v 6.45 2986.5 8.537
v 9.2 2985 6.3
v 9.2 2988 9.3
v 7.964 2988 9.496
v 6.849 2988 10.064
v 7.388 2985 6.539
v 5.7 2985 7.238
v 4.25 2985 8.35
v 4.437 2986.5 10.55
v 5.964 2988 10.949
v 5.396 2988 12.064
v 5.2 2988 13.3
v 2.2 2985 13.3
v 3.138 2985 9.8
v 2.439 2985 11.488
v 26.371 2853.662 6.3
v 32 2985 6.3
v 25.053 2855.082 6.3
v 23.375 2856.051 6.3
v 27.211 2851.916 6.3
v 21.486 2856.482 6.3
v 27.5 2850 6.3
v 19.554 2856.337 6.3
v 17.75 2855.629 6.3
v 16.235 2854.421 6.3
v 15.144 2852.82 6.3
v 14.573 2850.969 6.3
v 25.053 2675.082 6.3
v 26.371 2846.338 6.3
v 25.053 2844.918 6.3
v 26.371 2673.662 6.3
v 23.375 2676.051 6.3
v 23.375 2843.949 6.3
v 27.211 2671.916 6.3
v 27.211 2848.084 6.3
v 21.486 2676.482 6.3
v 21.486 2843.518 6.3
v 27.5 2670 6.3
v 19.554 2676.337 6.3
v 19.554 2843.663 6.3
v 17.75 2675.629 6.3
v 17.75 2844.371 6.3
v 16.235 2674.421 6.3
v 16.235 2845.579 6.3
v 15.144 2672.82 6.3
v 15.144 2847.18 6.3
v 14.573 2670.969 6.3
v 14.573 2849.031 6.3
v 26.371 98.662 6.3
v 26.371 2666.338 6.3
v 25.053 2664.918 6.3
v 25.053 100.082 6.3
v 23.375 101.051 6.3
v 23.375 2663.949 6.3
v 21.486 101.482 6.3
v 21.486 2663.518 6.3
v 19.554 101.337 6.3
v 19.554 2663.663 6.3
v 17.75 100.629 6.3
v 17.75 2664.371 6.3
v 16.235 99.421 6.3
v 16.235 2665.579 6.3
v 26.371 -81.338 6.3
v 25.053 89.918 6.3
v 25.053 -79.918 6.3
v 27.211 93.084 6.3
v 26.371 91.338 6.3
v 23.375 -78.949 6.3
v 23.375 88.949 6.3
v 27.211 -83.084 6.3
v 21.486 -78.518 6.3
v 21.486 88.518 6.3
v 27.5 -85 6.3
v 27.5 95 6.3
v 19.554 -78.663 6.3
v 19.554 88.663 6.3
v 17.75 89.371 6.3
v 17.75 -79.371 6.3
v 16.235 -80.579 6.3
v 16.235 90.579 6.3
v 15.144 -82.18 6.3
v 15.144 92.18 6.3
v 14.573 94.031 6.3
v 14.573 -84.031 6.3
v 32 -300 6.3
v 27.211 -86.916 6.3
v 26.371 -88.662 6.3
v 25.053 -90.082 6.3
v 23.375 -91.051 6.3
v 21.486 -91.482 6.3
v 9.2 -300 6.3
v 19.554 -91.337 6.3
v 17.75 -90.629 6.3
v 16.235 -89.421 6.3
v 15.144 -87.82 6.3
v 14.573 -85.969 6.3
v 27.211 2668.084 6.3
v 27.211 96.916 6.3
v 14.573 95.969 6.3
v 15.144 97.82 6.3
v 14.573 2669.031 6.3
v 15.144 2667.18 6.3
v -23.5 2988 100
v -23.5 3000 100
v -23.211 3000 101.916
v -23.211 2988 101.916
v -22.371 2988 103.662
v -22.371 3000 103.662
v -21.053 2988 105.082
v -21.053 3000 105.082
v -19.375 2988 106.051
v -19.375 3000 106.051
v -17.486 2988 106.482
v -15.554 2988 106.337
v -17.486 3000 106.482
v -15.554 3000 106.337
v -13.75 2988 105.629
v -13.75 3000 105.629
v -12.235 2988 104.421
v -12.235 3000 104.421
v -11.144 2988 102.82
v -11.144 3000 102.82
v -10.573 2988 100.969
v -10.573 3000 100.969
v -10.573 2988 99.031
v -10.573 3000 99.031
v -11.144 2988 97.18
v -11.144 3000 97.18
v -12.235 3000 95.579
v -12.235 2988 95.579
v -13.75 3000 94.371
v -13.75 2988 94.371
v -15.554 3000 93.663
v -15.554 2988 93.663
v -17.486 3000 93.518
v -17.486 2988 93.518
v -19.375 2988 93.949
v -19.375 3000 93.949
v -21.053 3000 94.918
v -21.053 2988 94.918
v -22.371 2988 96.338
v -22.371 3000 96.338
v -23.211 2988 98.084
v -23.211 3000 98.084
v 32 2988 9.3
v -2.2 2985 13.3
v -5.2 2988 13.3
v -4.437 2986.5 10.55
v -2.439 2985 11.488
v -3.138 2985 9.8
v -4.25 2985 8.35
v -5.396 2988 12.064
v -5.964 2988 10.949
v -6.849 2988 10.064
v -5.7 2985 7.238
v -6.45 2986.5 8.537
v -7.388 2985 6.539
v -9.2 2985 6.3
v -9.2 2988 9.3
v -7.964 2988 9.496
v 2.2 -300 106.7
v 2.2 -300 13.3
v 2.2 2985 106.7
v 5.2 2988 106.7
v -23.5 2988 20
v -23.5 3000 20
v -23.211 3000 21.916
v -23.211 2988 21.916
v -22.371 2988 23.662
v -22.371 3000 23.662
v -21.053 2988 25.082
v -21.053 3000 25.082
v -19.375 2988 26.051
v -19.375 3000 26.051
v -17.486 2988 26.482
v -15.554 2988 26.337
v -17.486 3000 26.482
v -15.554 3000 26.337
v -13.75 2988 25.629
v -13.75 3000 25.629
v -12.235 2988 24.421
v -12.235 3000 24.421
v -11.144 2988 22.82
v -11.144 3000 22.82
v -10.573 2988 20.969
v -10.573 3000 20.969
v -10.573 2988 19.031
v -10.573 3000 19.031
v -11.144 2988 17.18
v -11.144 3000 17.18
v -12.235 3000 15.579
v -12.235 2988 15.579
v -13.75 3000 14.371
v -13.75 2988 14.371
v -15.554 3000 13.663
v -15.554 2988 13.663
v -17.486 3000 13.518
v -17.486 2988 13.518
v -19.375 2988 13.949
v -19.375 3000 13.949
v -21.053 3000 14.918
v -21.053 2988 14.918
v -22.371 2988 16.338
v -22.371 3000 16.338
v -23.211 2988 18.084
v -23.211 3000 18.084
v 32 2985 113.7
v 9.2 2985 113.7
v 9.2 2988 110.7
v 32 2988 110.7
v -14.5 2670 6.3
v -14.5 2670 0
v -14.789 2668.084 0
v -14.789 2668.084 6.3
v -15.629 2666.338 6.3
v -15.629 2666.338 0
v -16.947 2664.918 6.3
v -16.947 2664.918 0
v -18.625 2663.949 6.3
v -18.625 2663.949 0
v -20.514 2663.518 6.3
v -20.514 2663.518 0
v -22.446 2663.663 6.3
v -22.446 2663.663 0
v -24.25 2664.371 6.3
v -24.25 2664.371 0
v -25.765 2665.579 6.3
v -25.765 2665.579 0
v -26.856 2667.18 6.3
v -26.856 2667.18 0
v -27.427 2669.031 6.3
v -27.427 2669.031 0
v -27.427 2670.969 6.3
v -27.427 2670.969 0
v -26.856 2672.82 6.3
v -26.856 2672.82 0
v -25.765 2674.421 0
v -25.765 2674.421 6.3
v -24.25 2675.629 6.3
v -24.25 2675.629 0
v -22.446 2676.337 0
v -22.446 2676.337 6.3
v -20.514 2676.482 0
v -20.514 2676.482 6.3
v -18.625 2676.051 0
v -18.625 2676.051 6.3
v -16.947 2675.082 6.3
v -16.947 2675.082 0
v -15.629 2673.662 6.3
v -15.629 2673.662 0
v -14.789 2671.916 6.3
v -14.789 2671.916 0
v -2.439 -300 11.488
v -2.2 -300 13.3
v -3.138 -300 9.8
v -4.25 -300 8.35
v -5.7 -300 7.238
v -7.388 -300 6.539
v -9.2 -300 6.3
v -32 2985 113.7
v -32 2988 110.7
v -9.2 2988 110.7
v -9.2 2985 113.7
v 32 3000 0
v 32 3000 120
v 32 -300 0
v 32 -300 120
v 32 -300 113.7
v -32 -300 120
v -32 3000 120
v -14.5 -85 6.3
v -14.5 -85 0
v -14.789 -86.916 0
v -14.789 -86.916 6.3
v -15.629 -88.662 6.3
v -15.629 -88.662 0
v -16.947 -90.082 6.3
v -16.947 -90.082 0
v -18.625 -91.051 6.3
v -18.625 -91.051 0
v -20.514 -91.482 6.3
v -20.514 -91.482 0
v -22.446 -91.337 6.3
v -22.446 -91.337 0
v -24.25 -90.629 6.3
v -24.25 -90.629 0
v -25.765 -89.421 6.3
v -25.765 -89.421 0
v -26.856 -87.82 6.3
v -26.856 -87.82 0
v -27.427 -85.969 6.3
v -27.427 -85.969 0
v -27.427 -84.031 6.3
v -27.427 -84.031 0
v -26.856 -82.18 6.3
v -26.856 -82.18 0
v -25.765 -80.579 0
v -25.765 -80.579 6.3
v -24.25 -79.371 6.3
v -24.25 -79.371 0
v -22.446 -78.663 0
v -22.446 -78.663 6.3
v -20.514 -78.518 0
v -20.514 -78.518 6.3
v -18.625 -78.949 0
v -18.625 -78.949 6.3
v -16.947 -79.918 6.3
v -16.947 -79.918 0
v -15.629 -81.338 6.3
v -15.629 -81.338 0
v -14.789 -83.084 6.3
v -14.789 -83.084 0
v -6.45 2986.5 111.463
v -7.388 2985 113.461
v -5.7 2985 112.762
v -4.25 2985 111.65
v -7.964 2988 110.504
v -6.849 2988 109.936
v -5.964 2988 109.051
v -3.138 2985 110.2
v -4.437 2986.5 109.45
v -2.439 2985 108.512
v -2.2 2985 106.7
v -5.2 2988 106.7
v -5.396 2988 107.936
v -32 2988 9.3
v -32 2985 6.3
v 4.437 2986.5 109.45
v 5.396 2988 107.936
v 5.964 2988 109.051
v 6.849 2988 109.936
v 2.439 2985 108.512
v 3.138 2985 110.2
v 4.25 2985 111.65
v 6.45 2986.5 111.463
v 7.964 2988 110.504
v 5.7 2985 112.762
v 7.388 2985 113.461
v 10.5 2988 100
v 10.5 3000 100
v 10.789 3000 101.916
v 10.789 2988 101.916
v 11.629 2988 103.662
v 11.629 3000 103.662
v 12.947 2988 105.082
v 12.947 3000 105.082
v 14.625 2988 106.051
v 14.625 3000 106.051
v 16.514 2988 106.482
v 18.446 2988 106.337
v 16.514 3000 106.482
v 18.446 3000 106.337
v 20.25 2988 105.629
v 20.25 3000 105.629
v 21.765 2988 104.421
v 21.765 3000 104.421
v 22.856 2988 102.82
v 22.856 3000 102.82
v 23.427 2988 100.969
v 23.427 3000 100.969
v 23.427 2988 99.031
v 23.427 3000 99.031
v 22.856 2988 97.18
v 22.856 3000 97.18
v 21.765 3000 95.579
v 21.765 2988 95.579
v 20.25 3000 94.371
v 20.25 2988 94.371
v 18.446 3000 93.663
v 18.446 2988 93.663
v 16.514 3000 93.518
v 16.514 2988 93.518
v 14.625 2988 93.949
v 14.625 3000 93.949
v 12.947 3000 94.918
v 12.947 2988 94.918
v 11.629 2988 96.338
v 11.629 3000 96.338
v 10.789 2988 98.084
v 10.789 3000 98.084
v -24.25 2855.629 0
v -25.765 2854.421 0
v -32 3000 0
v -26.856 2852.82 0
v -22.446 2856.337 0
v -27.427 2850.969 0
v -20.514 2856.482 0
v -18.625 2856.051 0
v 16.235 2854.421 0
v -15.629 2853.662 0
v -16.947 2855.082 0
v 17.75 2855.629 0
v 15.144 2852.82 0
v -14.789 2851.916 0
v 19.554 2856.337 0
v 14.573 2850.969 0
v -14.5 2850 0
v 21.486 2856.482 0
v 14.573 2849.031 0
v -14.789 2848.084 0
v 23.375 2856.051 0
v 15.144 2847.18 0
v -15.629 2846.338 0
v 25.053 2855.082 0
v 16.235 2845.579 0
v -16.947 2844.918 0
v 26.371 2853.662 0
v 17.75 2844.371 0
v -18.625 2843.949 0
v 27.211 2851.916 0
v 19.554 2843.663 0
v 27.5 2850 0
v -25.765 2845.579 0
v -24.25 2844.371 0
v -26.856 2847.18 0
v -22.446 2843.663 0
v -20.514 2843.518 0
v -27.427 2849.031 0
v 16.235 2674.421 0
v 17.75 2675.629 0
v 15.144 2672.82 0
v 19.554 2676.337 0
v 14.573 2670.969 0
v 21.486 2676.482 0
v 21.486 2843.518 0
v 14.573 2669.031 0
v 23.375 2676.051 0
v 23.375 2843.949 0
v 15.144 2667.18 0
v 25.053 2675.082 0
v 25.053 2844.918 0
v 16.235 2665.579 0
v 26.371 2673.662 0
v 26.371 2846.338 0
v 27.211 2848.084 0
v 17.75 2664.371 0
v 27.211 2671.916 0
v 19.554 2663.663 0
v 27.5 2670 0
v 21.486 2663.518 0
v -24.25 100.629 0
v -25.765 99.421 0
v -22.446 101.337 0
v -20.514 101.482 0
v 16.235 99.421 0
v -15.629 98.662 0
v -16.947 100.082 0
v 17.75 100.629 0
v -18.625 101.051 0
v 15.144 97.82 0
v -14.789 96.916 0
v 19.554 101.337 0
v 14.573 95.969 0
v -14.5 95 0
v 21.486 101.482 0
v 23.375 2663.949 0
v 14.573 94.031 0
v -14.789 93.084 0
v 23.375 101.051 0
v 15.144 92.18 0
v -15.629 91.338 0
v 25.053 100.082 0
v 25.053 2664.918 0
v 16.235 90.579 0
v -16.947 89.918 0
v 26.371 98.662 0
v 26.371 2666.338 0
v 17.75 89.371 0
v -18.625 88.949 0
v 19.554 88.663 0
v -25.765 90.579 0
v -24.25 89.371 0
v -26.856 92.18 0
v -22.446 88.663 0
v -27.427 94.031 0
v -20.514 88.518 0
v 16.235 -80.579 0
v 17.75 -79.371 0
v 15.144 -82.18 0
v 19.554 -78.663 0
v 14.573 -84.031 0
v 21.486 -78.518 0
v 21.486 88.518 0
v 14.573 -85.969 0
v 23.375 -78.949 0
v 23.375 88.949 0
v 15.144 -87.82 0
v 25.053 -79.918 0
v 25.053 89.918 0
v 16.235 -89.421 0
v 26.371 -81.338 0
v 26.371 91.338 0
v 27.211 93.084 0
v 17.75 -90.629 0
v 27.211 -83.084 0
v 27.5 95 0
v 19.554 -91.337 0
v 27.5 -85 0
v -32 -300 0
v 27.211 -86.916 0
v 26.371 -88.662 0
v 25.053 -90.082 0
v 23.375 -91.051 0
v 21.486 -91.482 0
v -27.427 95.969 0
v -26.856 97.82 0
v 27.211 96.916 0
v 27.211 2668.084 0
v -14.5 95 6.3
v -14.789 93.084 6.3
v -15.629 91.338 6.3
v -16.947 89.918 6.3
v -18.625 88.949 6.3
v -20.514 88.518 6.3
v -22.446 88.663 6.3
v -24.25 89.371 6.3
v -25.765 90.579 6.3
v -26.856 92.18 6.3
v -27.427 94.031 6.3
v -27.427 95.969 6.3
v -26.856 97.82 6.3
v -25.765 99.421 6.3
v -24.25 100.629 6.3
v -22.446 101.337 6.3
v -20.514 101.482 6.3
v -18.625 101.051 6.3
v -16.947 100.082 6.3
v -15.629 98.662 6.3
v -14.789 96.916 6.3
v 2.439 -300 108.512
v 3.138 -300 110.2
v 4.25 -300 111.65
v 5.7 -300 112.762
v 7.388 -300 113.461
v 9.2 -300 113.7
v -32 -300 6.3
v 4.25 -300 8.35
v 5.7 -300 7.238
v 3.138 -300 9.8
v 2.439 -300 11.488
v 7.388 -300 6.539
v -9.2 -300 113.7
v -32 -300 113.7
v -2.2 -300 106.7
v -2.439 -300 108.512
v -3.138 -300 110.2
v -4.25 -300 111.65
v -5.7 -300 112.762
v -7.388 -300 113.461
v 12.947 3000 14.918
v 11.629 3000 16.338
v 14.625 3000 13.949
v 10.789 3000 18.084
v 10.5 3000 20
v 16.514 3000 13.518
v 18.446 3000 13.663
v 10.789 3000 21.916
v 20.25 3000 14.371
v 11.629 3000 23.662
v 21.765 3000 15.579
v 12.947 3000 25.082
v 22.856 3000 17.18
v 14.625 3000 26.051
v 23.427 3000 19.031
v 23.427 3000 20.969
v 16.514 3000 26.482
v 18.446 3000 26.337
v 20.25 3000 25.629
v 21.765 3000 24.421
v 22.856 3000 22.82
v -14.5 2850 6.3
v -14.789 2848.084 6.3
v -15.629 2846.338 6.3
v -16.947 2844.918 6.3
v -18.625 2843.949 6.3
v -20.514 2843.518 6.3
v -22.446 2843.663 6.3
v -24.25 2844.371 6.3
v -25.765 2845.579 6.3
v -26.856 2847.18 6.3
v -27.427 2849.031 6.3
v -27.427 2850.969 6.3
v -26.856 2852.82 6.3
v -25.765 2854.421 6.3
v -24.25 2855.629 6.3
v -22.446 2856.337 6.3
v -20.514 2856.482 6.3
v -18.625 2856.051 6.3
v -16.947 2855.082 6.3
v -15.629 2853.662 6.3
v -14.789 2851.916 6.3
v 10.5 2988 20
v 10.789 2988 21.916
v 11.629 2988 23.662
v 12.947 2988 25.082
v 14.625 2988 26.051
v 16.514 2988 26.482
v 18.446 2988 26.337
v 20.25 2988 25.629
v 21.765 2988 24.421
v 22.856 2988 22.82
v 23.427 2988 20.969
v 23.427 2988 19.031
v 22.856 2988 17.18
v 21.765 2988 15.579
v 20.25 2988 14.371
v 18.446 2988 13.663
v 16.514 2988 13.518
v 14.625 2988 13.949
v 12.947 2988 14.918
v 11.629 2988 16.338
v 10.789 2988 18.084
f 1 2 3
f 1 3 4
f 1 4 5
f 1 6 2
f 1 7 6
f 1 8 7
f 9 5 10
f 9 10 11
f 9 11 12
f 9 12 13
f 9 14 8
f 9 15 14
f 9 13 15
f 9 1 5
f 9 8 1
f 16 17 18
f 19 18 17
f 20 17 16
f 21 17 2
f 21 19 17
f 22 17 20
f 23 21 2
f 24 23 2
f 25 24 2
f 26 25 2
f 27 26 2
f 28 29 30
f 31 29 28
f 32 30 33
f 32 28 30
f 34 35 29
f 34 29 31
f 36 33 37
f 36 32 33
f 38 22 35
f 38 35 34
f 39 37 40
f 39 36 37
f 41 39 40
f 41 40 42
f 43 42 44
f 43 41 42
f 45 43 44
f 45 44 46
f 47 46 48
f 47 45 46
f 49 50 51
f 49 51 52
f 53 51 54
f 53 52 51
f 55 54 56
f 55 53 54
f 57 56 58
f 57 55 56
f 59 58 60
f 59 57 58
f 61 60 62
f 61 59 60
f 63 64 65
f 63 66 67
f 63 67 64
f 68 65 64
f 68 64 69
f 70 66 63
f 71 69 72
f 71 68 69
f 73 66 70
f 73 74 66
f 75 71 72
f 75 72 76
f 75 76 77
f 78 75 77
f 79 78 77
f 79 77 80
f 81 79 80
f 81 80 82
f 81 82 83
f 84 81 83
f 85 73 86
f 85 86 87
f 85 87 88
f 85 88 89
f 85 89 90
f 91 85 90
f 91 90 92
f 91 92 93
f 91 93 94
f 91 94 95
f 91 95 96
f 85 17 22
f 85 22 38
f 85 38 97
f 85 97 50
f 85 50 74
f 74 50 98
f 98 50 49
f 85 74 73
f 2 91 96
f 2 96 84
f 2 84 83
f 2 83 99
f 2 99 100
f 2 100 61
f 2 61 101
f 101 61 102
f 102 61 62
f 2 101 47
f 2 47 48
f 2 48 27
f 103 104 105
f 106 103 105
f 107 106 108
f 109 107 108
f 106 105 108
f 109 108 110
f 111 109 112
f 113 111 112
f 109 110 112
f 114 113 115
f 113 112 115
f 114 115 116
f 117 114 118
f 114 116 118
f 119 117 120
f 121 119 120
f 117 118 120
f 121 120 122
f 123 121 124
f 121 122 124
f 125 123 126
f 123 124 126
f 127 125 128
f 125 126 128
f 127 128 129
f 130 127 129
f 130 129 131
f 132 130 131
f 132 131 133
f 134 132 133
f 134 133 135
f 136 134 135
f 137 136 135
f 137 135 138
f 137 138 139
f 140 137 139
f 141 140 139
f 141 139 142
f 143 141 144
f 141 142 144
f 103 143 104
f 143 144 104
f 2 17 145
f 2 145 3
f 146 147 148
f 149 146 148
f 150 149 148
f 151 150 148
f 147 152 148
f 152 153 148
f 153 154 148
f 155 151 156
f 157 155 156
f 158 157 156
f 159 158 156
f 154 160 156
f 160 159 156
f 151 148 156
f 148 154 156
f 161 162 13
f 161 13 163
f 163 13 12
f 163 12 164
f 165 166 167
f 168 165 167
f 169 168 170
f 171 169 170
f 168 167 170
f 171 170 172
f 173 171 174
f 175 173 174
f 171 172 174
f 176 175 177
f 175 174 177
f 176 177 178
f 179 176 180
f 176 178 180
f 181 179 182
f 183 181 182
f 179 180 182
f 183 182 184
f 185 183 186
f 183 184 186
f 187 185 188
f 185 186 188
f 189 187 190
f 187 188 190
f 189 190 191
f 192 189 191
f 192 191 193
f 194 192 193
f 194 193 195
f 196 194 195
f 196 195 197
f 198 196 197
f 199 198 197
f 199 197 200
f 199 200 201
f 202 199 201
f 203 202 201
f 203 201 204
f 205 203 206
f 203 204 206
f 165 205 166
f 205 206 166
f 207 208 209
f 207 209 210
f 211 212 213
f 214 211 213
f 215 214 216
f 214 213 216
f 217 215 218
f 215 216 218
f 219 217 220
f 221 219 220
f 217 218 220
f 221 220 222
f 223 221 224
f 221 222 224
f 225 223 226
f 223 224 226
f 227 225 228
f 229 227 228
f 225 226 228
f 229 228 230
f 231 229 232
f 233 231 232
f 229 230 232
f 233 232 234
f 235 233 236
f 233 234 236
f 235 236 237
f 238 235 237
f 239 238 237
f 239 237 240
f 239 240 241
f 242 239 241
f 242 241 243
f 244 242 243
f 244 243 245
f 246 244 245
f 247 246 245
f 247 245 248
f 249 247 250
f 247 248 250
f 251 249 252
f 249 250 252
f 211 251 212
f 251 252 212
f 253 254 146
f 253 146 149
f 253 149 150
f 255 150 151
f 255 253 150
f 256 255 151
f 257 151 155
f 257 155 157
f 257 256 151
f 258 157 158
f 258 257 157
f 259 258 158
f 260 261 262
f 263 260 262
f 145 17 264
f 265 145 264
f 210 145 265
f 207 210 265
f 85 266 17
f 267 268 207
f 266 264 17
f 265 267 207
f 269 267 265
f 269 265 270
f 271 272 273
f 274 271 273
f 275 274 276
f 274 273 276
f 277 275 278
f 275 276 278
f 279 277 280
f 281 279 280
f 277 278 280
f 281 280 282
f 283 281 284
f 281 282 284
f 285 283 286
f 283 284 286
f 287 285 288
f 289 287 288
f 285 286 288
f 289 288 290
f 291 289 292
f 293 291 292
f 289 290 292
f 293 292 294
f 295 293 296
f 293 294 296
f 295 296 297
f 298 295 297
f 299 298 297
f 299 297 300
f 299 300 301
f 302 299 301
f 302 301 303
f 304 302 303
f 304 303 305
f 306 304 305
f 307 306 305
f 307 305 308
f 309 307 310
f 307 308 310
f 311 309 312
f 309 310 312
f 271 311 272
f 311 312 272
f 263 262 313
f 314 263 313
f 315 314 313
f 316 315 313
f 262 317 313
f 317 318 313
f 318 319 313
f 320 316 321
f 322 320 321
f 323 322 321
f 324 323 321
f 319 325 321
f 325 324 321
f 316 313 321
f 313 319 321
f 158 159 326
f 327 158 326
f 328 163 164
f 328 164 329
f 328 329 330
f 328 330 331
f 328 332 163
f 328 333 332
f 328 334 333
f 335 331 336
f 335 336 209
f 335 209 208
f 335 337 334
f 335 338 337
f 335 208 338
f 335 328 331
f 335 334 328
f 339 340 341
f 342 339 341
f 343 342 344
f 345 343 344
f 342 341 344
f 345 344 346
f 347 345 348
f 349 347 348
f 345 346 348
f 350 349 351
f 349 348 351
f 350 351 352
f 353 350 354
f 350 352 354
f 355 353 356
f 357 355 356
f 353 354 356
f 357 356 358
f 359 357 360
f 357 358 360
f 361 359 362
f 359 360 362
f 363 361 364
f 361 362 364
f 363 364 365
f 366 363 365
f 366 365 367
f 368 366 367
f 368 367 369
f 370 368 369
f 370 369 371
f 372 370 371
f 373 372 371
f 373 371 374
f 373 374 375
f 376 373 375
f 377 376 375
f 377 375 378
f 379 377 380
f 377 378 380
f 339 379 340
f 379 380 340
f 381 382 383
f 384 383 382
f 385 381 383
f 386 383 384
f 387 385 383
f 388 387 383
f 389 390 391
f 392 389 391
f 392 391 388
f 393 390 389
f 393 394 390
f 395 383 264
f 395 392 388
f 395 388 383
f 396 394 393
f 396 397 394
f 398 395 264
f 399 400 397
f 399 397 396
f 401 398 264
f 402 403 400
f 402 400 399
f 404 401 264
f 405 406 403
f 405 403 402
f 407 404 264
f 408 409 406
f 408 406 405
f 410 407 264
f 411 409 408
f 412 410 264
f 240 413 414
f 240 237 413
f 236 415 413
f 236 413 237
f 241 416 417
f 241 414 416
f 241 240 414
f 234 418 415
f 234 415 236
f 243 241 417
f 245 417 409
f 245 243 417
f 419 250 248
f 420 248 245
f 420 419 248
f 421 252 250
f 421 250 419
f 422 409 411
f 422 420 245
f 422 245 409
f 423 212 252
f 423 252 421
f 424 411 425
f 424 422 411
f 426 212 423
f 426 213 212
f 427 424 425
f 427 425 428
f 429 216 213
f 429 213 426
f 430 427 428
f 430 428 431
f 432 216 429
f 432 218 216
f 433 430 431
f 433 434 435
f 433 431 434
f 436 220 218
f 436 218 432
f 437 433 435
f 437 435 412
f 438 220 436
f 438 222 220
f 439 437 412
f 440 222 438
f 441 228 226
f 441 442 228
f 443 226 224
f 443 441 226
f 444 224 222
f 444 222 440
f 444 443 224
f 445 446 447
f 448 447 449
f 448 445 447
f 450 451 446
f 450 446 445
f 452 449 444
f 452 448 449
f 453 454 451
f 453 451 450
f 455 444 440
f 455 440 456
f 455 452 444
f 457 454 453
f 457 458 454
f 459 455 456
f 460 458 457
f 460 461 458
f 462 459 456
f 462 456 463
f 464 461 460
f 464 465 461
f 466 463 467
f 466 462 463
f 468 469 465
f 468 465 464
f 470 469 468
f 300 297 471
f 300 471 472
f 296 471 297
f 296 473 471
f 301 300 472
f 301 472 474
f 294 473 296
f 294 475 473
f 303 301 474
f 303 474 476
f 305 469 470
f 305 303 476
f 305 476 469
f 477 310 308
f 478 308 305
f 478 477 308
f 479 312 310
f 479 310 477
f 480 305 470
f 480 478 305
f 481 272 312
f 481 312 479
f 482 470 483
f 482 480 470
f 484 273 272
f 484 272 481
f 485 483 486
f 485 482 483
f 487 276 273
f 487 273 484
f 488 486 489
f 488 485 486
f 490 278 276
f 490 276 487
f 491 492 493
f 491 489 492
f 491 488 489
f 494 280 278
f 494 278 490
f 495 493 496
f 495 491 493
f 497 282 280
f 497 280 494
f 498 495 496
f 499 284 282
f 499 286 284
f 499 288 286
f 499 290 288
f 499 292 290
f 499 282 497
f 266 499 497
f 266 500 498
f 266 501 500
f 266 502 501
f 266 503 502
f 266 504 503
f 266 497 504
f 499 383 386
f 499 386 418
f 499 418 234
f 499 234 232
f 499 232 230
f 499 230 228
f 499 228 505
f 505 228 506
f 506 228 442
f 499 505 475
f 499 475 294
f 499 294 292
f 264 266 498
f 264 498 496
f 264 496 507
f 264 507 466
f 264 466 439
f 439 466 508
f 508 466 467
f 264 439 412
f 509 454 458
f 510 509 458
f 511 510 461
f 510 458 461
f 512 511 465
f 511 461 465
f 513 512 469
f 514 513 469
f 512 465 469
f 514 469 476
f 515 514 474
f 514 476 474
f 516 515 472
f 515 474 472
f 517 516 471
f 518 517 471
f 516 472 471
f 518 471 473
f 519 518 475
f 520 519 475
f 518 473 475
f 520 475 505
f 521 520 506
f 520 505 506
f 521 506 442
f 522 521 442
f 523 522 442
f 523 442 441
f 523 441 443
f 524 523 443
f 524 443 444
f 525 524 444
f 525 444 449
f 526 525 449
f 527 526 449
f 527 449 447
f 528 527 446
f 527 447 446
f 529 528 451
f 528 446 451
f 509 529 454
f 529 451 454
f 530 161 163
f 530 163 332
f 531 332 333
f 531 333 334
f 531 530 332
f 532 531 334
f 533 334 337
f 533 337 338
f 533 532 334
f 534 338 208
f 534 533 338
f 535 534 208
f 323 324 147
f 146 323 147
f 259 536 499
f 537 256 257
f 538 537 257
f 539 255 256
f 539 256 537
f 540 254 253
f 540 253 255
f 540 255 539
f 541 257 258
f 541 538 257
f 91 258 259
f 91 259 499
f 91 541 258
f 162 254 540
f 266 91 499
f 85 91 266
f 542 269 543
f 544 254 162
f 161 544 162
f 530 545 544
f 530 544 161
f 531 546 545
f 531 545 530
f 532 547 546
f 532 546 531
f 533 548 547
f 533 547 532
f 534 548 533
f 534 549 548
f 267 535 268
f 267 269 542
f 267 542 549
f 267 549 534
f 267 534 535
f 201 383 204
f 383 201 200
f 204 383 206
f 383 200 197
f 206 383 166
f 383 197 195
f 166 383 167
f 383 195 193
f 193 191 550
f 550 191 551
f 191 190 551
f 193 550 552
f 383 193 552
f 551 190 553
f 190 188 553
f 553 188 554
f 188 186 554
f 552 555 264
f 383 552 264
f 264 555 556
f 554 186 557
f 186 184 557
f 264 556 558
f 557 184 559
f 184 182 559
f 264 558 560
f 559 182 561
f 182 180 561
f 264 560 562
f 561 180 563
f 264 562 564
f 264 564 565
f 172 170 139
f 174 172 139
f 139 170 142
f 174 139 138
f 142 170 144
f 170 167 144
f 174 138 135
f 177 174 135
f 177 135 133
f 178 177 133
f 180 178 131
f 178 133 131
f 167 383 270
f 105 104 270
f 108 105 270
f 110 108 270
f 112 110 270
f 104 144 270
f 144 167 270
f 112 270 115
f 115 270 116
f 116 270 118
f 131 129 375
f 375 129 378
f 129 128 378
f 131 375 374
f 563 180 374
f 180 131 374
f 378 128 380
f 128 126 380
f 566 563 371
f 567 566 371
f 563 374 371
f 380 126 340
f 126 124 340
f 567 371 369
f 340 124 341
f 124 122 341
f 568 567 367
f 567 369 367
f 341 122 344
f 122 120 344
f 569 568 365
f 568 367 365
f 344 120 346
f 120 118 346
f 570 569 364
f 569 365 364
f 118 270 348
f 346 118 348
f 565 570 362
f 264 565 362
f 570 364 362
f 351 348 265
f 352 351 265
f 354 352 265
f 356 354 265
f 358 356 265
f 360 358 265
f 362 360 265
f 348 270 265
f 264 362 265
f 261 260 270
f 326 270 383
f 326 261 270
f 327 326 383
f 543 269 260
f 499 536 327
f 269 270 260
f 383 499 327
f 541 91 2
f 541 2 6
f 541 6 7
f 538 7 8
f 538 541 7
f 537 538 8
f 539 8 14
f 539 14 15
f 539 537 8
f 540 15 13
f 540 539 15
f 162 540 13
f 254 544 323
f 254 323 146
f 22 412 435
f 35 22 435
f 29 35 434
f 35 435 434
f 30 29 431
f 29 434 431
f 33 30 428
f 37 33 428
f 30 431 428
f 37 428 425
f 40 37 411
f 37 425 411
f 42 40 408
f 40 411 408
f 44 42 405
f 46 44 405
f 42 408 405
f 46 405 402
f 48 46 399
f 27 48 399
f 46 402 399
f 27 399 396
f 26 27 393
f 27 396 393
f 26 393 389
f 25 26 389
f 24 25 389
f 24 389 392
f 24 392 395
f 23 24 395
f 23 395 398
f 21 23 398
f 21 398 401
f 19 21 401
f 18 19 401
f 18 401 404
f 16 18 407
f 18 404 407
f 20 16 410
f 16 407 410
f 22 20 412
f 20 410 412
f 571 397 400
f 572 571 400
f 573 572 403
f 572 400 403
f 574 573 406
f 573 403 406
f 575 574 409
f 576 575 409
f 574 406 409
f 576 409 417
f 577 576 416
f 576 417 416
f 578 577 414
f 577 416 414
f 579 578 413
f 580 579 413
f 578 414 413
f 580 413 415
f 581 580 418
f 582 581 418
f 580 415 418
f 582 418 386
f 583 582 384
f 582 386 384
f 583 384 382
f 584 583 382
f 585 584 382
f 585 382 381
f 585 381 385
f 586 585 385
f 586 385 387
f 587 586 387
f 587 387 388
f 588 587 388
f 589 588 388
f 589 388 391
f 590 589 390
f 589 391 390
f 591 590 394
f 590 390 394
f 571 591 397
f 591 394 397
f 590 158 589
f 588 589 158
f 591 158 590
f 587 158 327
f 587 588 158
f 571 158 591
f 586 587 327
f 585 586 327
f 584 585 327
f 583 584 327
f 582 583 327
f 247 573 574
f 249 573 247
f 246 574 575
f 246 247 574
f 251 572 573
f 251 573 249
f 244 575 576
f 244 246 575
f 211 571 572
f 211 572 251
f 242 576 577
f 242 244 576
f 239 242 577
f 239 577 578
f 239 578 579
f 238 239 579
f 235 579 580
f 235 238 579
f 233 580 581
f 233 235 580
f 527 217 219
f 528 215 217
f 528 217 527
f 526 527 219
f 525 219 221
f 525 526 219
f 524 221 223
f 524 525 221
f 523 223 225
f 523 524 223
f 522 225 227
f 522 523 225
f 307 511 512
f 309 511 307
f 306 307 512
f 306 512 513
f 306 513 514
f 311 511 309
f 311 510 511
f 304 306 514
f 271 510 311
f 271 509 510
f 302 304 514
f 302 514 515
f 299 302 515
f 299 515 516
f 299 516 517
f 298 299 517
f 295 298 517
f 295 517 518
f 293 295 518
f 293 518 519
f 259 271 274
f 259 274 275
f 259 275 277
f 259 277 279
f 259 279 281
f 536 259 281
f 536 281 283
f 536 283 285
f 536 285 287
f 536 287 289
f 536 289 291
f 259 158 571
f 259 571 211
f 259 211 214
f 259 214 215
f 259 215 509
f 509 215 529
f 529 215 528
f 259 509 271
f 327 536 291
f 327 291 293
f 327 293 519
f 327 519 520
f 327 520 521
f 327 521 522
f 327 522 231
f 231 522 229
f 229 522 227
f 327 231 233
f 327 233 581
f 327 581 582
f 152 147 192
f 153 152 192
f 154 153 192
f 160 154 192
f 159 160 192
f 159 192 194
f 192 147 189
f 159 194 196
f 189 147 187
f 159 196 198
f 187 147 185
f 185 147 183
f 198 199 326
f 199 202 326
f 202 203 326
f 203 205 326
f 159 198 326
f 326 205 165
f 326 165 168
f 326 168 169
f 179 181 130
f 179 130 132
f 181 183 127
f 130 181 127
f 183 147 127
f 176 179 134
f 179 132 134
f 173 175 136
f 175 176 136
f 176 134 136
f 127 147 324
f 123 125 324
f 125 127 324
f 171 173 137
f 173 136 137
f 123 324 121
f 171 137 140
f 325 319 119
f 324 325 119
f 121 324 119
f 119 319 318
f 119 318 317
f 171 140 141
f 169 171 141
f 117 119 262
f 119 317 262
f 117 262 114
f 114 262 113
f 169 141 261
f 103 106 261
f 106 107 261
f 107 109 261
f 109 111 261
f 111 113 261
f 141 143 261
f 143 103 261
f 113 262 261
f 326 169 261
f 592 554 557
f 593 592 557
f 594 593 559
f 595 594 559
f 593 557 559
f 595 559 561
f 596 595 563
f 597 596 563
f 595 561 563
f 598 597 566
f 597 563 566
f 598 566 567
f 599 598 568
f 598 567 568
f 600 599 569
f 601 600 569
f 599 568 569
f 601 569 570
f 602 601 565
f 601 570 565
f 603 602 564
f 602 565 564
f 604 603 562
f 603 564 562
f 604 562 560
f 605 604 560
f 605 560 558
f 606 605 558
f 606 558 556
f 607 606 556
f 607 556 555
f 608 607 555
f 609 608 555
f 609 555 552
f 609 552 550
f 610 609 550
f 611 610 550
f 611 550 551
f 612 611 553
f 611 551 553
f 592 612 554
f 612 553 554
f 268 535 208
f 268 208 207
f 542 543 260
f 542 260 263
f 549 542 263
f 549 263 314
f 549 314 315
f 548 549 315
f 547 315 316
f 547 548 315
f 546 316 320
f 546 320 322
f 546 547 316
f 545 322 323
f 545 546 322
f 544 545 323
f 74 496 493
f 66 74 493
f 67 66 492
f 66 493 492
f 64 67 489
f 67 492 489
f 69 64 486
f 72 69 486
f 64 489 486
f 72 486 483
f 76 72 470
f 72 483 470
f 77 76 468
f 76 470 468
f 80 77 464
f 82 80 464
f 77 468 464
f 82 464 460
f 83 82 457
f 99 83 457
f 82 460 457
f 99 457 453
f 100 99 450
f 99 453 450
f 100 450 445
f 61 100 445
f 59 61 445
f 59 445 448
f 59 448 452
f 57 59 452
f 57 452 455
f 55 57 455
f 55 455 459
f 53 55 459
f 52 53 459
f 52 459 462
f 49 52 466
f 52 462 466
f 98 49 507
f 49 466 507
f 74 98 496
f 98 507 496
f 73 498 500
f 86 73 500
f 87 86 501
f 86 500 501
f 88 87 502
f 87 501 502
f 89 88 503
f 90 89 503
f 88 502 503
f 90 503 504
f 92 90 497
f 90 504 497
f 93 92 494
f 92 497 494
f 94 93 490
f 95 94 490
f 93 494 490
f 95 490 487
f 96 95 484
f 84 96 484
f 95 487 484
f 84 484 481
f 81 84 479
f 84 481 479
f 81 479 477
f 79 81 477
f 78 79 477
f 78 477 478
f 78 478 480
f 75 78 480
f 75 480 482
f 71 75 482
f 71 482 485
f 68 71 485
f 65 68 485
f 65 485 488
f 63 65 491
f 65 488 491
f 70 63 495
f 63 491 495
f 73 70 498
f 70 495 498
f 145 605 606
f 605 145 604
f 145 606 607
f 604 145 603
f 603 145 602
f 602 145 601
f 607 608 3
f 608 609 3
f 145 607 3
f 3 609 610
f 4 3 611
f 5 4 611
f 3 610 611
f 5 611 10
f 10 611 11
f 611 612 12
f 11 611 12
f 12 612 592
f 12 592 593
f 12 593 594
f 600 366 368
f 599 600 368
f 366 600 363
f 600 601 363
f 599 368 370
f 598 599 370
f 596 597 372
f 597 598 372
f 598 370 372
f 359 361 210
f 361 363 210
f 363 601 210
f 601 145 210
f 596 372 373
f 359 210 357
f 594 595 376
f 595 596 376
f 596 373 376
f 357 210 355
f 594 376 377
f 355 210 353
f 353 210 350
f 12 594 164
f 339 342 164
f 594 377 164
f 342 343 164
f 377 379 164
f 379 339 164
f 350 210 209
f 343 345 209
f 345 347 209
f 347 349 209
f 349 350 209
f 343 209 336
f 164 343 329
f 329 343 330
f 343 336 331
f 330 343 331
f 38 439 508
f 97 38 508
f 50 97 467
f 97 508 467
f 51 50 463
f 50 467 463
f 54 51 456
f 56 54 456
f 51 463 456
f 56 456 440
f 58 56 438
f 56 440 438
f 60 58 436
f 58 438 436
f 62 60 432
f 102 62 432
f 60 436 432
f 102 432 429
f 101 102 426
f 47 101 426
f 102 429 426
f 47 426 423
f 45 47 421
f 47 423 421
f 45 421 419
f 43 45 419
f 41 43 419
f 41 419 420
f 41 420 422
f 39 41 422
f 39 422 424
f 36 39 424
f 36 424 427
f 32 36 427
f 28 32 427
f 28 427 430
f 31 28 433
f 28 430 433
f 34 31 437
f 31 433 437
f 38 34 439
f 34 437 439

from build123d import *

# Parameters (mm, degrees)
F1_DEPTH      = 300
F1_DEPTH_BACK = 3000
F2_R          = 6.5
F3_DEPTH      = 12
F4_SIZE       = 3
F5_SIZE       = 3
F6_R          = 6.5
F7_DEPTH      = 6.3


# Not quite as in the source:
# - a feature names something its author has since deleted; it is built from what else it names


with BuildPart() as f1:
    # F0 (on Front) → F1 (new body, two sides)
    with BuildSketch(Plane.XZ) as f1_sk:
        with BuildLine():
            Line((-32, 6.3), (-32, 0))
            Line((-32, 0), (32, 0))
            Line((32, 0), (32, 6.3))
            Line((32, 6.3), (9.2, 6.3))
            ThreePointArc((9.2, 6.3), (4.2502525317, 8.3502525317), (2.2, 13.3))
            Line((2.2, 13.3), (2.2, 106.7))
            ThreePointArc((2.2, 106.7), (4.2502525317, 111.6497474683), (9.2, 113.7))
            Line((9.2, 113.7), (32, 113.7))
            Line((32, 113.7), (32, 120))
            Line((32, 120), (-32, 120))
            Line((-32, 120), (-32, 113.7))
            Line((-32, 113.7), (-9.2, 113.7))
            ThreePointArc((-9.2, 113.7), (-4.2502525317, 111.6497474683), (-2.2, 106.7))
            Line((-2.2, 106.7), (-2.2, 13.3))
            ThreePointArc((-2.2, 13.3), (-4.2502525317, 8.3502525317), (-9.2, 6.3))
            Line((-9.2, 6.3), (-32, 6.3))
        make_face()
    extrude(amount=F1_DEPTH)
    extrude(f1_sk.sketch, amount=-F1_DEPTH_BACK)

    # F2 (on face) → F3 (join)
    with BuildSketch(Plane(origin=(0, 3000, 0), x_dir=(-1, 0, 0), z_dir=(0, 1, 0))):
        with BuildLine():
            Line((9.2, 6.3), (32, 6.3))
            Line((32, 6.3), (32, 113.7))
            Line((32, 113.7), (9.2, 113.7))
            ThreePointArc((9.2, 113.7), (4.2502525317, 111.6497474683), (2.2, 106.7))
            Line((2.2, 106.7), (2.2, 13.3))
            ThreePointArc((2.2, 13.3), (4.2502525317, 8.3502525317), (9.2, 6.3))
        make_face()
        with Locations((17, 20)):
            Circle(F2_R, mode=Mode.SUBTRACT)
        with Locations((17, 100)):
            Circle(F2_R, mode=Mode.SUBTRACT)
        with BuildLine():
            Line((-32, 113.7), (-32, 6.3))
            Line((-32, 6.3), (-9.2, 6.3))
            ThreePointArc((-9.2, 6.3), (-4.2502525317, 8.3502525317), (-2.2, 13.3))
            Line((-2.2, 13.3), (-2.2, 106.7))
            ThreePointArc((-2.2, 106.7), (-4.2502525317, 111.6497474683), (-9.2, 113.7))
            Line((-9.2, 113.7), (-32, 113.7))
        make_face()
        with Locations((-17, 20)):
            Circle(F2_R, mode=Mode.SUBTRACT)
        with Locations((-17, 100)):
            Circle(F2_R, mode=Mode.SUBTRACT)
        with BuildLine():
            Line((-32, 6.3), (-32, 0))
            Line((-32, 0), (32, 0))
            Line((32, 0), (32, 6.3))
            Line((32, 6.3), (9.2, 6.3))
            ThreePointArc((9.2, 6.3), (4.2502525317, 8.3502525317), (2.2, 13.3))
            Line((2.2, 13.3), (2.2, 106.7))
            ThreePointArc((2.2, 106.7), (4.2502525317, 111.6497474683), (9.2, 113.7))
            Line((9.2, 113.7), (32, 113.7))
            Line((32, 113.7), (32, 120))
            Line((32, 120), (-32, 120))
            Line((-32, 120), (-32, 113.7))
            Line((-32, 113.7), (-9.2, 113.7))
            ThreePointArc((-9.2, 113.7), (-4.2502525317, 111.6497474683), (-2.2, 106.7))
            Line((-2.2, 106.7), (-2.2, 13.3))
            ThreePointArc((-2.2, 13.3), (-4.2502525317, 8.3502525317), (-9.2, 6.3))
            Line((-9.2, 6.3), (-32, 6.3))
        make_face()
    extrude(amount=-F3_DEPTH)

    # F4
    f4_edges = [f1.edges().sort_by_distance(p)[0] for p in [
        (20.6, 2988, 113.7),
        (4.250253, 2988, 111.649747),
        (2.2, 2988, 60),
        (4.250253, 2988, 8.350253),
        (20.6, 2988, 6.3),
    ]]
    chamfer(f4_edges, length=F4_SIZE)

    # F5
    f5_edges = [f1.edges().sort_by_distance(p)[0] for p in [
        (-20.6, 2988, 6.3),
        (-4.250253, 2988, 8.350253),
        (-2.2, 2988, 60),
        (-4.250253, 2988, 111.649747),
        (-20.6, 2988, 113.7),
    ]]
    chamfer(f5_edges, length=F5_SIZE)

    # F6 (on face) → F7 (cut, through all)
    with BuildSketch(Plane(origin=(0, 0, 0), x_dir=(1, 0, 0), z_dir=(0, 0, -1))):
        with Locations((21, 85)):
            Circle(F6_R)
        with Locations((-21, 85)):
            Circle(F6_R)
        with Locations((-21, -95)):
            Circle(F6_R)
        with Locations((21, -95)):
            Circle(F6_R)
        with Locations((-21, -2670)):
            Circle(F6_R)
        with Locations((21, -2670)):
            Circle(F6_R)
        with Locations((21, -2850)):
            Circle(F6_R)
        with Locations((-21, -2850)):
            Circle(F6_R)
    extrude(amount=-F7_DEPTH, mode=Mode.SUBTRACT)


solid = f1.part
